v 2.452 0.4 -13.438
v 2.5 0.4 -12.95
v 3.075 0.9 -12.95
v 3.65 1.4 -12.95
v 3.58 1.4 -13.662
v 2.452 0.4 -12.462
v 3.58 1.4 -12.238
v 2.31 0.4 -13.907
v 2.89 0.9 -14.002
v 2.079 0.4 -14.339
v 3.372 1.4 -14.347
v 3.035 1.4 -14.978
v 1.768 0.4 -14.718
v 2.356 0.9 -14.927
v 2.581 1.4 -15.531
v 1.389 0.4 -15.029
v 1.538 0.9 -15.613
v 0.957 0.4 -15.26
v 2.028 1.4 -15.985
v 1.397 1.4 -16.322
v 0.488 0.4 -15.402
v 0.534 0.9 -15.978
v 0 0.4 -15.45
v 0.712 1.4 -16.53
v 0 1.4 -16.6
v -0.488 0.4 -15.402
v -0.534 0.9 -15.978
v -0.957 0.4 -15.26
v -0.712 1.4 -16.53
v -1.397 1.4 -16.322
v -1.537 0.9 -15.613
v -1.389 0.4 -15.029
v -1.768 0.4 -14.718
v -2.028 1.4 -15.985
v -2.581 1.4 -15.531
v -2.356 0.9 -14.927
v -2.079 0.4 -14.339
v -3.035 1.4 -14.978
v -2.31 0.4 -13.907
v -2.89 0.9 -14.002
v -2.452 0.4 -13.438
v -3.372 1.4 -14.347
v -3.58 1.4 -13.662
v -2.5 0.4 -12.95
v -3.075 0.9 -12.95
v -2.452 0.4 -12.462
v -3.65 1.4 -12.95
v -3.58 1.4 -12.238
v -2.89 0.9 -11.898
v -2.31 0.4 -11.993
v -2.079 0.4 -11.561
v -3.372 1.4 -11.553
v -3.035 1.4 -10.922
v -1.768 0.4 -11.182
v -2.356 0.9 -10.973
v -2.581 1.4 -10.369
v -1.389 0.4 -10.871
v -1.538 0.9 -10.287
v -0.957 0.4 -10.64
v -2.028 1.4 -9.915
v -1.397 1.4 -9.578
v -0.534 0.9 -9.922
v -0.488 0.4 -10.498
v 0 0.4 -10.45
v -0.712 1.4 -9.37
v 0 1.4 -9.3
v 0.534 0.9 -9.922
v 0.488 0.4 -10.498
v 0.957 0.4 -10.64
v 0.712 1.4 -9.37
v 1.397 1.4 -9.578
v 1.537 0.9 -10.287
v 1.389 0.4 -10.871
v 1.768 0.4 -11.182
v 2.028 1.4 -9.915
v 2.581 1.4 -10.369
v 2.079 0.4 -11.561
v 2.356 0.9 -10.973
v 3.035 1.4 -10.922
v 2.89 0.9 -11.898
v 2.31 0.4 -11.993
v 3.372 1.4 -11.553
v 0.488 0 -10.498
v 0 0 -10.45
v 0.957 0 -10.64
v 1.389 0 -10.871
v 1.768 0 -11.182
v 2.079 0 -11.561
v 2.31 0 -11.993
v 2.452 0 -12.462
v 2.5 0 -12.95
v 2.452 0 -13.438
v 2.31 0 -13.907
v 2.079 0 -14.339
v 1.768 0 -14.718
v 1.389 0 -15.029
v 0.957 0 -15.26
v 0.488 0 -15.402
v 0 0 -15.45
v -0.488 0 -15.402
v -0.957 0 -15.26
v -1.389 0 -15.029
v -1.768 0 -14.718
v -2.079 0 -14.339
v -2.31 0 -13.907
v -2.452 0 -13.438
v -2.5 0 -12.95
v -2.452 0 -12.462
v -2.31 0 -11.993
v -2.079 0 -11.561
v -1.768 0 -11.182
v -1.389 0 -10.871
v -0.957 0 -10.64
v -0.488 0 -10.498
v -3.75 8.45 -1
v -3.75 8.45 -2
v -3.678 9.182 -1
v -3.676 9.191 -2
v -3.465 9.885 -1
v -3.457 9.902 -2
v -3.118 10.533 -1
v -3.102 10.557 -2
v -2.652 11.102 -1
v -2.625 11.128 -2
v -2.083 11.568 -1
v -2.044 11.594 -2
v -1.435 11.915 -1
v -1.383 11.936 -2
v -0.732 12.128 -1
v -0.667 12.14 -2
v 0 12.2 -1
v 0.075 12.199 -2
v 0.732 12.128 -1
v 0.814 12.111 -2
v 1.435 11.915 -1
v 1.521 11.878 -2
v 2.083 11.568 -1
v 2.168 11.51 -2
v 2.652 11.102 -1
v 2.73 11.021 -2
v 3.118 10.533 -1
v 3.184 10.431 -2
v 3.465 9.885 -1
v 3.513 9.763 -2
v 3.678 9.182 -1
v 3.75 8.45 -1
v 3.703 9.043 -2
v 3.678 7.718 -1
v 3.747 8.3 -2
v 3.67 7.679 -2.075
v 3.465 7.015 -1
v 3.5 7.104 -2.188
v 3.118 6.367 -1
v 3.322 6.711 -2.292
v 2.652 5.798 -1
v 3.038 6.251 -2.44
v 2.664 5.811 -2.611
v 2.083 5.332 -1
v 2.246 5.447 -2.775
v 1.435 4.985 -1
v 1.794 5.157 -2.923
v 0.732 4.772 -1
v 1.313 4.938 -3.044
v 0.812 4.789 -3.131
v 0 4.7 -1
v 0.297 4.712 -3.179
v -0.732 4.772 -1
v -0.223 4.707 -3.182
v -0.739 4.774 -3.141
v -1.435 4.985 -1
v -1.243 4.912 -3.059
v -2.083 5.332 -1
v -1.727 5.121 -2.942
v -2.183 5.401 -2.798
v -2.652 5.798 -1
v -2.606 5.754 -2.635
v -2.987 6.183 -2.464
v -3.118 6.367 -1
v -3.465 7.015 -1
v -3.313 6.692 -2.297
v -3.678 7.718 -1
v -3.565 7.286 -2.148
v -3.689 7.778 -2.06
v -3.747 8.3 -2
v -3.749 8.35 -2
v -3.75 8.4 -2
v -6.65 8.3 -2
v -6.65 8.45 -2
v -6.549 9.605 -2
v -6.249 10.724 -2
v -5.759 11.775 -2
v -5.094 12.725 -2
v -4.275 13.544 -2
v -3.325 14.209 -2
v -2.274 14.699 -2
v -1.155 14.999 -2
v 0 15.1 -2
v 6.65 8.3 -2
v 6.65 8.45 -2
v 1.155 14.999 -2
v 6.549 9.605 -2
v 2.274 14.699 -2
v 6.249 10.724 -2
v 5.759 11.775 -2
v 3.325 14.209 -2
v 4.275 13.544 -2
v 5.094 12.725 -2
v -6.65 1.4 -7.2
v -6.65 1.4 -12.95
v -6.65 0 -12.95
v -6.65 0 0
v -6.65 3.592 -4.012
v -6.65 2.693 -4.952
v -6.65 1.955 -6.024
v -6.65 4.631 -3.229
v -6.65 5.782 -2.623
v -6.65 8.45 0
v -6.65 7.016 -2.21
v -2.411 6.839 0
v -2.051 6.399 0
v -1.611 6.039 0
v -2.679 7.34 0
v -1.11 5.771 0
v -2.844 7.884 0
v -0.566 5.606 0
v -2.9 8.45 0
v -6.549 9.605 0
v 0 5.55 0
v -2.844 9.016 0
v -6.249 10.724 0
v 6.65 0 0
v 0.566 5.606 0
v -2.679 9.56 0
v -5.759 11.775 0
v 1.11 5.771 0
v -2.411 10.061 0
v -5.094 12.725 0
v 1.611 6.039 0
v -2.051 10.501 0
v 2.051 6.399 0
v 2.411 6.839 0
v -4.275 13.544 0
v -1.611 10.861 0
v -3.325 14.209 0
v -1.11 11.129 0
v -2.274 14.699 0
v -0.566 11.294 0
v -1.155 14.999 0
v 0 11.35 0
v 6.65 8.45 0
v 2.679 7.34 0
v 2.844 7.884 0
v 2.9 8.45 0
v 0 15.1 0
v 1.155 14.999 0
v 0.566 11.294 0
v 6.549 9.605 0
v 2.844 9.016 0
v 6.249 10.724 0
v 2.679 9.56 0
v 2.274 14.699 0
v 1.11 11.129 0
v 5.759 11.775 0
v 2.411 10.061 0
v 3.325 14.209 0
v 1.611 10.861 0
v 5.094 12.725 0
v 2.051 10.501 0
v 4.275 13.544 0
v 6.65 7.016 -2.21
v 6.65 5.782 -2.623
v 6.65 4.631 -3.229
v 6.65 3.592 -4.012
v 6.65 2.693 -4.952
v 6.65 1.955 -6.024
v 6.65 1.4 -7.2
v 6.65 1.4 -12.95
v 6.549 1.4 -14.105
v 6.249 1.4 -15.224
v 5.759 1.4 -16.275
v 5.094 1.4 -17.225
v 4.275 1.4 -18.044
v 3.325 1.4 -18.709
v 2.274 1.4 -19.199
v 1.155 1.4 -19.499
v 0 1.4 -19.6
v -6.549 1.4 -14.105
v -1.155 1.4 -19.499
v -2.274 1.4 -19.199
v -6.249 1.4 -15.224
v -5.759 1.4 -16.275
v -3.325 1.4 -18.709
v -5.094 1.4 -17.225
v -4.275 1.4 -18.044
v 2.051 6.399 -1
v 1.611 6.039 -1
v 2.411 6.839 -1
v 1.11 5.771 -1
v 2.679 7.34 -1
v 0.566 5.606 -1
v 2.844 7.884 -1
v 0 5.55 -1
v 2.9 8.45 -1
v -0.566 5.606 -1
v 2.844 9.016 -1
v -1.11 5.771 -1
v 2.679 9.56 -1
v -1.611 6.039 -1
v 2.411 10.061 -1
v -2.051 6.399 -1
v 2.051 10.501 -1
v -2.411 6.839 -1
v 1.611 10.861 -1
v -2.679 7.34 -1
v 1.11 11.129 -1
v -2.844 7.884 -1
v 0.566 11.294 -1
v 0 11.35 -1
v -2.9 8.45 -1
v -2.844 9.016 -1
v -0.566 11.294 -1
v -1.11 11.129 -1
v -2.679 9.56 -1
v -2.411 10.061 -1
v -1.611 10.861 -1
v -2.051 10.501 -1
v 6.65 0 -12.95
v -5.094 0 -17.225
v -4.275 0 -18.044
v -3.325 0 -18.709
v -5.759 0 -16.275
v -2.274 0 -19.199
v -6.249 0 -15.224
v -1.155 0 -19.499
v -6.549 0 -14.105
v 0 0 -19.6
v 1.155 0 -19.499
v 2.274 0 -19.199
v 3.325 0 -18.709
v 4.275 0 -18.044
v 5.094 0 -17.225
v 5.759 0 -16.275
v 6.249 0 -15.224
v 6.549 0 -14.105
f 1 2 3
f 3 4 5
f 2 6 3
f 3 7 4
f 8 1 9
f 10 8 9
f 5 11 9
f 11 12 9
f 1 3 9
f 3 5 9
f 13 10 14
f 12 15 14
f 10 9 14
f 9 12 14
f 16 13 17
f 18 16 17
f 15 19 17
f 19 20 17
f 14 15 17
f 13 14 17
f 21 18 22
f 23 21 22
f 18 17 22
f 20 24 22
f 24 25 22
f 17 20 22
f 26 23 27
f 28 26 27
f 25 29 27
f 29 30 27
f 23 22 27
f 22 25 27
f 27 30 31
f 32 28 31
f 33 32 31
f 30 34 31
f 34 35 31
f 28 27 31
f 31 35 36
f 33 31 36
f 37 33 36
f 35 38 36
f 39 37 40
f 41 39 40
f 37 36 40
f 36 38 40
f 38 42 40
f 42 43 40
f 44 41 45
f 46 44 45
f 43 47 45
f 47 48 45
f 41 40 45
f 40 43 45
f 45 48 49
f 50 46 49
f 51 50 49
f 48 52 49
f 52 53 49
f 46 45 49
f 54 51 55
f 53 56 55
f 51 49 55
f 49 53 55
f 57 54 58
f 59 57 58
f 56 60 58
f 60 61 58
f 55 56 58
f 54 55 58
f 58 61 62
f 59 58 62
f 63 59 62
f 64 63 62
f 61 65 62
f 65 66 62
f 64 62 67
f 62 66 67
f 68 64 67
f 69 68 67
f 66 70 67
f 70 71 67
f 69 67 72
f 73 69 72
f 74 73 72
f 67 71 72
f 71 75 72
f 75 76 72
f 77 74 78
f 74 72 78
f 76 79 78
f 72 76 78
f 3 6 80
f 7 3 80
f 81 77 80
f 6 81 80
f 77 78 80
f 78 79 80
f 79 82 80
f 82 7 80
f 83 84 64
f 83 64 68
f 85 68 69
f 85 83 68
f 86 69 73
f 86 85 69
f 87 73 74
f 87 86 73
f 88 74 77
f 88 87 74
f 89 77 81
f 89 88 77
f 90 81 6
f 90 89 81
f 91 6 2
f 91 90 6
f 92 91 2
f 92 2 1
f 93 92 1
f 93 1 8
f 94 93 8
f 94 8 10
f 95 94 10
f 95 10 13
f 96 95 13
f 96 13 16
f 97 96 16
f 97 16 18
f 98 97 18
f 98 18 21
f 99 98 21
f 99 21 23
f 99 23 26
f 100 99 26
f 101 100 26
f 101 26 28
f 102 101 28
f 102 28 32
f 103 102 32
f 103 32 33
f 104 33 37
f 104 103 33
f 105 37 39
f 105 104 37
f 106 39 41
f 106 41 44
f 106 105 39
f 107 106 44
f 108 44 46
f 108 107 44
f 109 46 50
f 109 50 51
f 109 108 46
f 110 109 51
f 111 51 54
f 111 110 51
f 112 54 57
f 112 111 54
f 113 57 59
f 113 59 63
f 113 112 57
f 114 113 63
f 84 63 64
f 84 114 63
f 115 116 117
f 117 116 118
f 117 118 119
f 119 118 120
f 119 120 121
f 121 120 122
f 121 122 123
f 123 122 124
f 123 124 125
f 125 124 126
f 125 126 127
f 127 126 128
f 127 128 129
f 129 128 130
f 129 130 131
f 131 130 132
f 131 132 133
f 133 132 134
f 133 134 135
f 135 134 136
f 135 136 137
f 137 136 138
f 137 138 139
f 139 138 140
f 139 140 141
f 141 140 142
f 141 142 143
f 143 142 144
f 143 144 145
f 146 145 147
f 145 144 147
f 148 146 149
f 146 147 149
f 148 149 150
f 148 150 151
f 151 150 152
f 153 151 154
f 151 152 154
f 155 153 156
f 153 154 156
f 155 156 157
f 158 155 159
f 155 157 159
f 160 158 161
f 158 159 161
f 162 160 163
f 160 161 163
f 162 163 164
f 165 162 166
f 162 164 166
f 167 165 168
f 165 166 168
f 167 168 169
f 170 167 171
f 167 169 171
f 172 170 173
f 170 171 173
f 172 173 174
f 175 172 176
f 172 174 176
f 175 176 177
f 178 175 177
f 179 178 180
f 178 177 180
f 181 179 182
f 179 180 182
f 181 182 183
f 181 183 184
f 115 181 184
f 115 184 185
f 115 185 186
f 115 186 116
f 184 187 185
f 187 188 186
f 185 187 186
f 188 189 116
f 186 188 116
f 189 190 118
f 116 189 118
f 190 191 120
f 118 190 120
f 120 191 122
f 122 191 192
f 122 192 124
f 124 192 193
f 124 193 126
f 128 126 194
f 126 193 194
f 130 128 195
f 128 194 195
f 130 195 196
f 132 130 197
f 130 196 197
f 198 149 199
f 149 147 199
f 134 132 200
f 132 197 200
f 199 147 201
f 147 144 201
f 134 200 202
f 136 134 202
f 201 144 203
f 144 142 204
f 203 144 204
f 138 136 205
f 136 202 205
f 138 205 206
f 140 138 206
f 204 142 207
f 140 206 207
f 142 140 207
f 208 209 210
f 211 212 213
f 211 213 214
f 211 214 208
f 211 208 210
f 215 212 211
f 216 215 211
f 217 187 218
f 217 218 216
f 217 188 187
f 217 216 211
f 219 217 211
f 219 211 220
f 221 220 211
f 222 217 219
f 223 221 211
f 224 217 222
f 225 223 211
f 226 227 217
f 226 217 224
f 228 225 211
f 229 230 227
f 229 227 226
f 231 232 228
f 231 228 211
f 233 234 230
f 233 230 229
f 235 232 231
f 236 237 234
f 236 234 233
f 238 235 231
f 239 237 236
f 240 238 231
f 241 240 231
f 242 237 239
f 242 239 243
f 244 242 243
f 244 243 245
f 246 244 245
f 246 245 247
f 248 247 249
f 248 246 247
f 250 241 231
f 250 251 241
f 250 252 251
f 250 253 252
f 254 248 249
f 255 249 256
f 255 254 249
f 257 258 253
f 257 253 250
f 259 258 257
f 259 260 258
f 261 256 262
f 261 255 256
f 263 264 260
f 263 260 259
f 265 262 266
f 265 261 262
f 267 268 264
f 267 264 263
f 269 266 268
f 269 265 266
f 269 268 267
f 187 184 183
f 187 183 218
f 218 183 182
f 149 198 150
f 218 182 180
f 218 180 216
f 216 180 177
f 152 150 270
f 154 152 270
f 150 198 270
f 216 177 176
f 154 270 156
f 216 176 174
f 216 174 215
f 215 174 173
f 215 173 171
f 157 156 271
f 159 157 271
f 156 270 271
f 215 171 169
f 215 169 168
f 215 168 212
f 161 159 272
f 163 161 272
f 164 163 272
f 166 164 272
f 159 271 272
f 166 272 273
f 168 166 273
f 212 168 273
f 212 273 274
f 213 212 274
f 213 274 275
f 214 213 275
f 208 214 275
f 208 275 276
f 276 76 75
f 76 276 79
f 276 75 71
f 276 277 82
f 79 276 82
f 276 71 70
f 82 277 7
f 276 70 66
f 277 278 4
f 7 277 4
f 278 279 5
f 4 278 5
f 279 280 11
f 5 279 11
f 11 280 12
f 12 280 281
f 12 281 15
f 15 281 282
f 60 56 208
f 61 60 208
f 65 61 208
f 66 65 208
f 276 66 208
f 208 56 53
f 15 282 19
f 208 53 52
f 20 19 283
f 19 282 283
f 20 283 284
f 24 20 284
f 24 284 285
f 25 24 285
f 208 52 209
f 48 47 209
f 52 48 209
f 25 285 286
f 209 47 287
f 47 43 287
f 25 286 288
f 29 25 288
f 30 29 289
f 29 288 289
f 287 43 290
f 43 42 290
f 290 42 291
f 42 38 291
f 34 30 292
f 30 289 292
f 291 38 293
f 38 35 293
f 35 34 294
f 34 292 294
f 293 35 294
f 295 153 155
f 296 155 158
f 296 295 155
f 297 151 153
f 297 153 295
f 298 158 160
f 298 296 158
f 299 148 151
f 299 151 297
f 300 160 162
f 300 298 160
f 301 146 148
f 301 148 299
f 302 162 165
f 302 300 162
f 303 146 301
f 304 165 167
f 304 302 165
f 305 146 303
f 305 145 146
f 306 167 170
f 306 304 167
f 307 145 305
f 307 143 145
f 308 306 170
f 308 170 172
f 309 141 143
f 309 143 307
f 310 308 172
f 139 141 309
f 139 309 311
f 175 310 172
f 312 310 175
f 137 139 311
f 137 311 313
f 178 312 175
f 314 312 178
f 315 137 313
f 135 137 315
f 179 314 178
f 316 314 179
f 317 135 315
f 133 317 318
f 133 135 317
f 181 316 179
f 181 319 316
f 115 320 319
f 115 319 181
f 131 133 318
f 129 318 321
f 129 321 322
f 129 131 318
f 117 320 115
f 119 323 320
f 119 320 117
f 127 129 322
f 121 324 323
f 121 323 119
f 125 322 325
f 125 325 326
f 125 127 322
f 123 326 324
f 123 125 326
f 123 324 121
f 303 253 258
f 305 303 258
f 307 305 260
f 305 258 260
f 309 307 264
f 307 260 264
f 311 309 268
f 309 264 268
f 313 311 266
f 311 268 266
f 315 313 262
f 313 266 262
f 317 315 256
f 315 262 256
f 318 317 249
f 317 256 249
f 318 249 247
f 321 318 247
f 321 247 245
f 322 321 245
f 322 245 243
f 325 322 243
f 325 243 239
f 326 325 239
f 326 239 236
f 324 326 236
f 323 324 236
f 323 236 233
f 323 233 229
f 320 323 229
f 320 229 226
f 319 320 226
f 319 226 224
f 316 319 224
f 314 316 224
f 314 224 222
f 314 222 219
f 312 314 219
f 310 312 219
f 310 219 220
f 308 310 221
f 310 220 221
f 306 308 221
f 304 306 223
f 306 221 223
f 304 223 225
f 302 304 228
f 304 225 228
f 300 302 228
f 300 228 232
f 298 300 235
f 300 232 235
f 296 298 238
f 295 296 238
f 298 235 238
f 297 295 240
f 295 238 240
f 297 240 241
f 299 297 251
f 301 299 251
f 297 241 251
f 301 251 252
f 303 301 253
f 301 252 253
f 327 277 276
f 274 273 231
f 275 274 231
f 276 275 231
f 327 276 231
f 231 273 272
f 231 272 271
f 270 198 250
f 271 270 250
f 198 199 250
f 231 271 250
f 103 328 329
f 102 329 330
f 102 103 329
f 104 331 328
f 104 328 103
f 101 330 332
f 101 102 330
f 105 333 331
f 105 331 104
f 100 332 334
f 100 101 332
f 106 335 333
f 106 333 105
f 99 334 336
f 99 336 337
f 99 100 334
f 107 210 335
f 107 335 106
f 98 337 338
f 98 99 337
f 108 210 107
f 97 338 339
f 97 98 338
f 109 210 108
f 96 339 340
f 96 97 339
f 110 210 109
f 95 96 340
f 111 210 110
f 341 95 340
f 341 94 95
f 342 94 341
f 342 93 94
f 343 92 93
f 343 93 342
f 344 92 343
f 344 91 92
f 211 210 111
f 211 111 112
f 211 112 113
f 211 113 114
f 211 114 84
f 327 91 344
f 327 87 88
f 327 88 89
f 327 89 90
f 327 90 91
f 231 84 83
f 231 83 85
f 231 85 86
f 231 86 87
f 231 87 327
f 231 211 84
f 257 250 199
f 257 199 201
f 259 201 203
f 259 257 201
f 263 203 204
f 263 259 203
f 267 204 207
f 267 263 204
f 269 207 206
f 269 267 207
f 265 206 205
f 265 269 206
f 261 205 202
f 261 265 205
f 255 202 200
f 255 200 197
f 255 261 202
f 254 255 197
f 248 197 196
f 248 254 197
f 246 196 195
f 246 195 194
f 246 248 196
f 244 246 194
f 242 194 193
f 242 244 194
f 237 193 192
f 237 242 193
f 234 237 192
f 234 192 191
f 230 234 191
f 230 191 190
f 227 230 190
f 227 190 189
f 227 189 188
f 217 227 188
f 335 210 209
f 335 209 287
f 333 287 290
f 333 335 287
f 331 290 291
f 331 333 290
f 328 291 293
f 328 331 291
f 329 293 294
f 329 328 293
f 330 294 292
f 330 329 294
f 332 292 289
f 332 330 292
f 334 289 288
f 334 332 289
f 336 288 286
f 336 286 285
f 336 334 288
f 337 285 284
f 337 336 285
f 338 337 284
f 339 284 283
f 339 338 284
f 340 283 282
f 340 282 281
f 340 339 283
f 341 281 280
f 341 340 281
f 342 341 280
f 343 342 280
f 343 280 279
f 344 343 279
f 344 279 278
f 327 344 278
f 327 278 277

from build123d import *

# Parameters (mm, degrees)
ESQUISSE1_R             = 2.9
BOSS_EXTRU_3_DEPTH      = 2
ESQUISSE4_R             = 2.5
BOSS_EXTRU_4_DEPTH      = 1.4
BOSS_EXTRU_5_START      = -13.3
BOSS_EXTRU_5_DEPTH      = 13.3
ESQUISSE6_R             = 3.75
ENL_V_MAT_EXTRU_2_DEPTH = 1
ESQUISSE7_R             = 3.75
ENL_V_MAT_EXTRU_3_DEPTH = 25.863477231
ESQUISSE9_R             = 2.5
ESQUISSE8_R             = 3.65


with BuildPart() as part:
    # Esquisse1 → Boss.-Extru.3 (new body)
    with BuildSketch(Plane.XY):
        with BuildLine():
            Line((-6.65, 8.45), (-6.65, 0))
            Line((-6.65, 0), (6.65, 0))
            Line((6.65, 0), (6.65, 8.45))
            ThreePointArc((6.65, 8.45), (0, 15.1), (-6.65, 8.45))
        make_face()
        with Locations((0, 8.45)):
            Circle(ESQUISSE1_R, mode=Mode.SUBTRACT)
    extrude(amount=-BOSS_EXTRU_3_DEPTH)

    # Esquisse4 → Boss.-Extru.4 (add)
    with BuildSketch(Plane(origin=(0, 0, 0), x_dir=(1, 0, 0), z_dir=(0, 1, 0))):
        with BuildLine():
            Line((6.65, 0), (-6.65, 0))
            Line((-6.65, 0), (-6.65, 12.95))
            ThreePointArc((-6.65, 12.95), (0, 19.6), (6.65, 12.95))
            Line((6.65, 12.95), (6.65, 0))
        make_face()
        with Locations(Location((0, 12.95, 0), (0, 0, 270))):
            Circle(ESQUISSE4_R, mode=Mode.SUBTRACT)
    extrude(amount=BOSS_EXTRU_4_DEPTH)

    # Esquisse5 → Boss.-Extru.5 (add)
    with BuildSketch(Plane.ZY.offset(6.65).offset(BOSS_EXTRU_5_START)):
        with BuildLine():
            Line((-2, 1.4), (-2, 8.3))
            ThreePointArc((-2, 8.3), (-3.599475922, 4.095981854), (-7.2, 1.4))
            Line((-7.2, 1.4), (-2, 1.4))
        make_face()
    extrude(amount=BOSS_EXTRU_5_DEPTH)

    # Esquisse6 → Enlèv. mat.-Extru.2 (cut)
    with BuildSketch(Plane(origin=(0, 0, -2), x_dir=(-1, 0, 0), z_dir=(0, 0, -1))):
        with Locations((0, 8.45)):
            Circle(ESQUISSE6_R)
    extrude(amount=-ENL_V_MAT_EXTRU_2_DEPTH, mode=Mode.SUBTRACT)

    # Esquisse7 → Enlèv. mat.-Extru.3 (cut, through all)
    with BuildSketch(Plane(origin=(0, 0, -1), x_dir=(-1, 0, 0), z_dir=(0, 0, -1))):
        with Locations((0, 8.45)):
            Circle(ESQUISSE7_R)
    extrude(amount=ENL_V_MAT_EXTRU_3_DEPTH, mode=Mode.SUBTRACT)

    # Esquisse9 → Enlèvement de matière-Lissage1 section 0
    with BuildSketch(Plane(origin=(0, 0.4, 0), x_dir=(1, 0, 0), z_dir=(0, 1, 0))):
        with Locations((0, 12.95)):
            Circle(ESQUISSE9_R)
    # Esquisse8 → Enlèvement de matière-Lissage1 section 1
    with BuildSketch(Plane(origin=(0, 1.4, 0), x_dir=(1, 0, 0), z_dir=(0, 1, 0))):
        with Locations((0, 12.95)):
            Circle(ESQUISSE8_R)
    loft(mode=Mode.SUBTRACT)


solid = part.part
